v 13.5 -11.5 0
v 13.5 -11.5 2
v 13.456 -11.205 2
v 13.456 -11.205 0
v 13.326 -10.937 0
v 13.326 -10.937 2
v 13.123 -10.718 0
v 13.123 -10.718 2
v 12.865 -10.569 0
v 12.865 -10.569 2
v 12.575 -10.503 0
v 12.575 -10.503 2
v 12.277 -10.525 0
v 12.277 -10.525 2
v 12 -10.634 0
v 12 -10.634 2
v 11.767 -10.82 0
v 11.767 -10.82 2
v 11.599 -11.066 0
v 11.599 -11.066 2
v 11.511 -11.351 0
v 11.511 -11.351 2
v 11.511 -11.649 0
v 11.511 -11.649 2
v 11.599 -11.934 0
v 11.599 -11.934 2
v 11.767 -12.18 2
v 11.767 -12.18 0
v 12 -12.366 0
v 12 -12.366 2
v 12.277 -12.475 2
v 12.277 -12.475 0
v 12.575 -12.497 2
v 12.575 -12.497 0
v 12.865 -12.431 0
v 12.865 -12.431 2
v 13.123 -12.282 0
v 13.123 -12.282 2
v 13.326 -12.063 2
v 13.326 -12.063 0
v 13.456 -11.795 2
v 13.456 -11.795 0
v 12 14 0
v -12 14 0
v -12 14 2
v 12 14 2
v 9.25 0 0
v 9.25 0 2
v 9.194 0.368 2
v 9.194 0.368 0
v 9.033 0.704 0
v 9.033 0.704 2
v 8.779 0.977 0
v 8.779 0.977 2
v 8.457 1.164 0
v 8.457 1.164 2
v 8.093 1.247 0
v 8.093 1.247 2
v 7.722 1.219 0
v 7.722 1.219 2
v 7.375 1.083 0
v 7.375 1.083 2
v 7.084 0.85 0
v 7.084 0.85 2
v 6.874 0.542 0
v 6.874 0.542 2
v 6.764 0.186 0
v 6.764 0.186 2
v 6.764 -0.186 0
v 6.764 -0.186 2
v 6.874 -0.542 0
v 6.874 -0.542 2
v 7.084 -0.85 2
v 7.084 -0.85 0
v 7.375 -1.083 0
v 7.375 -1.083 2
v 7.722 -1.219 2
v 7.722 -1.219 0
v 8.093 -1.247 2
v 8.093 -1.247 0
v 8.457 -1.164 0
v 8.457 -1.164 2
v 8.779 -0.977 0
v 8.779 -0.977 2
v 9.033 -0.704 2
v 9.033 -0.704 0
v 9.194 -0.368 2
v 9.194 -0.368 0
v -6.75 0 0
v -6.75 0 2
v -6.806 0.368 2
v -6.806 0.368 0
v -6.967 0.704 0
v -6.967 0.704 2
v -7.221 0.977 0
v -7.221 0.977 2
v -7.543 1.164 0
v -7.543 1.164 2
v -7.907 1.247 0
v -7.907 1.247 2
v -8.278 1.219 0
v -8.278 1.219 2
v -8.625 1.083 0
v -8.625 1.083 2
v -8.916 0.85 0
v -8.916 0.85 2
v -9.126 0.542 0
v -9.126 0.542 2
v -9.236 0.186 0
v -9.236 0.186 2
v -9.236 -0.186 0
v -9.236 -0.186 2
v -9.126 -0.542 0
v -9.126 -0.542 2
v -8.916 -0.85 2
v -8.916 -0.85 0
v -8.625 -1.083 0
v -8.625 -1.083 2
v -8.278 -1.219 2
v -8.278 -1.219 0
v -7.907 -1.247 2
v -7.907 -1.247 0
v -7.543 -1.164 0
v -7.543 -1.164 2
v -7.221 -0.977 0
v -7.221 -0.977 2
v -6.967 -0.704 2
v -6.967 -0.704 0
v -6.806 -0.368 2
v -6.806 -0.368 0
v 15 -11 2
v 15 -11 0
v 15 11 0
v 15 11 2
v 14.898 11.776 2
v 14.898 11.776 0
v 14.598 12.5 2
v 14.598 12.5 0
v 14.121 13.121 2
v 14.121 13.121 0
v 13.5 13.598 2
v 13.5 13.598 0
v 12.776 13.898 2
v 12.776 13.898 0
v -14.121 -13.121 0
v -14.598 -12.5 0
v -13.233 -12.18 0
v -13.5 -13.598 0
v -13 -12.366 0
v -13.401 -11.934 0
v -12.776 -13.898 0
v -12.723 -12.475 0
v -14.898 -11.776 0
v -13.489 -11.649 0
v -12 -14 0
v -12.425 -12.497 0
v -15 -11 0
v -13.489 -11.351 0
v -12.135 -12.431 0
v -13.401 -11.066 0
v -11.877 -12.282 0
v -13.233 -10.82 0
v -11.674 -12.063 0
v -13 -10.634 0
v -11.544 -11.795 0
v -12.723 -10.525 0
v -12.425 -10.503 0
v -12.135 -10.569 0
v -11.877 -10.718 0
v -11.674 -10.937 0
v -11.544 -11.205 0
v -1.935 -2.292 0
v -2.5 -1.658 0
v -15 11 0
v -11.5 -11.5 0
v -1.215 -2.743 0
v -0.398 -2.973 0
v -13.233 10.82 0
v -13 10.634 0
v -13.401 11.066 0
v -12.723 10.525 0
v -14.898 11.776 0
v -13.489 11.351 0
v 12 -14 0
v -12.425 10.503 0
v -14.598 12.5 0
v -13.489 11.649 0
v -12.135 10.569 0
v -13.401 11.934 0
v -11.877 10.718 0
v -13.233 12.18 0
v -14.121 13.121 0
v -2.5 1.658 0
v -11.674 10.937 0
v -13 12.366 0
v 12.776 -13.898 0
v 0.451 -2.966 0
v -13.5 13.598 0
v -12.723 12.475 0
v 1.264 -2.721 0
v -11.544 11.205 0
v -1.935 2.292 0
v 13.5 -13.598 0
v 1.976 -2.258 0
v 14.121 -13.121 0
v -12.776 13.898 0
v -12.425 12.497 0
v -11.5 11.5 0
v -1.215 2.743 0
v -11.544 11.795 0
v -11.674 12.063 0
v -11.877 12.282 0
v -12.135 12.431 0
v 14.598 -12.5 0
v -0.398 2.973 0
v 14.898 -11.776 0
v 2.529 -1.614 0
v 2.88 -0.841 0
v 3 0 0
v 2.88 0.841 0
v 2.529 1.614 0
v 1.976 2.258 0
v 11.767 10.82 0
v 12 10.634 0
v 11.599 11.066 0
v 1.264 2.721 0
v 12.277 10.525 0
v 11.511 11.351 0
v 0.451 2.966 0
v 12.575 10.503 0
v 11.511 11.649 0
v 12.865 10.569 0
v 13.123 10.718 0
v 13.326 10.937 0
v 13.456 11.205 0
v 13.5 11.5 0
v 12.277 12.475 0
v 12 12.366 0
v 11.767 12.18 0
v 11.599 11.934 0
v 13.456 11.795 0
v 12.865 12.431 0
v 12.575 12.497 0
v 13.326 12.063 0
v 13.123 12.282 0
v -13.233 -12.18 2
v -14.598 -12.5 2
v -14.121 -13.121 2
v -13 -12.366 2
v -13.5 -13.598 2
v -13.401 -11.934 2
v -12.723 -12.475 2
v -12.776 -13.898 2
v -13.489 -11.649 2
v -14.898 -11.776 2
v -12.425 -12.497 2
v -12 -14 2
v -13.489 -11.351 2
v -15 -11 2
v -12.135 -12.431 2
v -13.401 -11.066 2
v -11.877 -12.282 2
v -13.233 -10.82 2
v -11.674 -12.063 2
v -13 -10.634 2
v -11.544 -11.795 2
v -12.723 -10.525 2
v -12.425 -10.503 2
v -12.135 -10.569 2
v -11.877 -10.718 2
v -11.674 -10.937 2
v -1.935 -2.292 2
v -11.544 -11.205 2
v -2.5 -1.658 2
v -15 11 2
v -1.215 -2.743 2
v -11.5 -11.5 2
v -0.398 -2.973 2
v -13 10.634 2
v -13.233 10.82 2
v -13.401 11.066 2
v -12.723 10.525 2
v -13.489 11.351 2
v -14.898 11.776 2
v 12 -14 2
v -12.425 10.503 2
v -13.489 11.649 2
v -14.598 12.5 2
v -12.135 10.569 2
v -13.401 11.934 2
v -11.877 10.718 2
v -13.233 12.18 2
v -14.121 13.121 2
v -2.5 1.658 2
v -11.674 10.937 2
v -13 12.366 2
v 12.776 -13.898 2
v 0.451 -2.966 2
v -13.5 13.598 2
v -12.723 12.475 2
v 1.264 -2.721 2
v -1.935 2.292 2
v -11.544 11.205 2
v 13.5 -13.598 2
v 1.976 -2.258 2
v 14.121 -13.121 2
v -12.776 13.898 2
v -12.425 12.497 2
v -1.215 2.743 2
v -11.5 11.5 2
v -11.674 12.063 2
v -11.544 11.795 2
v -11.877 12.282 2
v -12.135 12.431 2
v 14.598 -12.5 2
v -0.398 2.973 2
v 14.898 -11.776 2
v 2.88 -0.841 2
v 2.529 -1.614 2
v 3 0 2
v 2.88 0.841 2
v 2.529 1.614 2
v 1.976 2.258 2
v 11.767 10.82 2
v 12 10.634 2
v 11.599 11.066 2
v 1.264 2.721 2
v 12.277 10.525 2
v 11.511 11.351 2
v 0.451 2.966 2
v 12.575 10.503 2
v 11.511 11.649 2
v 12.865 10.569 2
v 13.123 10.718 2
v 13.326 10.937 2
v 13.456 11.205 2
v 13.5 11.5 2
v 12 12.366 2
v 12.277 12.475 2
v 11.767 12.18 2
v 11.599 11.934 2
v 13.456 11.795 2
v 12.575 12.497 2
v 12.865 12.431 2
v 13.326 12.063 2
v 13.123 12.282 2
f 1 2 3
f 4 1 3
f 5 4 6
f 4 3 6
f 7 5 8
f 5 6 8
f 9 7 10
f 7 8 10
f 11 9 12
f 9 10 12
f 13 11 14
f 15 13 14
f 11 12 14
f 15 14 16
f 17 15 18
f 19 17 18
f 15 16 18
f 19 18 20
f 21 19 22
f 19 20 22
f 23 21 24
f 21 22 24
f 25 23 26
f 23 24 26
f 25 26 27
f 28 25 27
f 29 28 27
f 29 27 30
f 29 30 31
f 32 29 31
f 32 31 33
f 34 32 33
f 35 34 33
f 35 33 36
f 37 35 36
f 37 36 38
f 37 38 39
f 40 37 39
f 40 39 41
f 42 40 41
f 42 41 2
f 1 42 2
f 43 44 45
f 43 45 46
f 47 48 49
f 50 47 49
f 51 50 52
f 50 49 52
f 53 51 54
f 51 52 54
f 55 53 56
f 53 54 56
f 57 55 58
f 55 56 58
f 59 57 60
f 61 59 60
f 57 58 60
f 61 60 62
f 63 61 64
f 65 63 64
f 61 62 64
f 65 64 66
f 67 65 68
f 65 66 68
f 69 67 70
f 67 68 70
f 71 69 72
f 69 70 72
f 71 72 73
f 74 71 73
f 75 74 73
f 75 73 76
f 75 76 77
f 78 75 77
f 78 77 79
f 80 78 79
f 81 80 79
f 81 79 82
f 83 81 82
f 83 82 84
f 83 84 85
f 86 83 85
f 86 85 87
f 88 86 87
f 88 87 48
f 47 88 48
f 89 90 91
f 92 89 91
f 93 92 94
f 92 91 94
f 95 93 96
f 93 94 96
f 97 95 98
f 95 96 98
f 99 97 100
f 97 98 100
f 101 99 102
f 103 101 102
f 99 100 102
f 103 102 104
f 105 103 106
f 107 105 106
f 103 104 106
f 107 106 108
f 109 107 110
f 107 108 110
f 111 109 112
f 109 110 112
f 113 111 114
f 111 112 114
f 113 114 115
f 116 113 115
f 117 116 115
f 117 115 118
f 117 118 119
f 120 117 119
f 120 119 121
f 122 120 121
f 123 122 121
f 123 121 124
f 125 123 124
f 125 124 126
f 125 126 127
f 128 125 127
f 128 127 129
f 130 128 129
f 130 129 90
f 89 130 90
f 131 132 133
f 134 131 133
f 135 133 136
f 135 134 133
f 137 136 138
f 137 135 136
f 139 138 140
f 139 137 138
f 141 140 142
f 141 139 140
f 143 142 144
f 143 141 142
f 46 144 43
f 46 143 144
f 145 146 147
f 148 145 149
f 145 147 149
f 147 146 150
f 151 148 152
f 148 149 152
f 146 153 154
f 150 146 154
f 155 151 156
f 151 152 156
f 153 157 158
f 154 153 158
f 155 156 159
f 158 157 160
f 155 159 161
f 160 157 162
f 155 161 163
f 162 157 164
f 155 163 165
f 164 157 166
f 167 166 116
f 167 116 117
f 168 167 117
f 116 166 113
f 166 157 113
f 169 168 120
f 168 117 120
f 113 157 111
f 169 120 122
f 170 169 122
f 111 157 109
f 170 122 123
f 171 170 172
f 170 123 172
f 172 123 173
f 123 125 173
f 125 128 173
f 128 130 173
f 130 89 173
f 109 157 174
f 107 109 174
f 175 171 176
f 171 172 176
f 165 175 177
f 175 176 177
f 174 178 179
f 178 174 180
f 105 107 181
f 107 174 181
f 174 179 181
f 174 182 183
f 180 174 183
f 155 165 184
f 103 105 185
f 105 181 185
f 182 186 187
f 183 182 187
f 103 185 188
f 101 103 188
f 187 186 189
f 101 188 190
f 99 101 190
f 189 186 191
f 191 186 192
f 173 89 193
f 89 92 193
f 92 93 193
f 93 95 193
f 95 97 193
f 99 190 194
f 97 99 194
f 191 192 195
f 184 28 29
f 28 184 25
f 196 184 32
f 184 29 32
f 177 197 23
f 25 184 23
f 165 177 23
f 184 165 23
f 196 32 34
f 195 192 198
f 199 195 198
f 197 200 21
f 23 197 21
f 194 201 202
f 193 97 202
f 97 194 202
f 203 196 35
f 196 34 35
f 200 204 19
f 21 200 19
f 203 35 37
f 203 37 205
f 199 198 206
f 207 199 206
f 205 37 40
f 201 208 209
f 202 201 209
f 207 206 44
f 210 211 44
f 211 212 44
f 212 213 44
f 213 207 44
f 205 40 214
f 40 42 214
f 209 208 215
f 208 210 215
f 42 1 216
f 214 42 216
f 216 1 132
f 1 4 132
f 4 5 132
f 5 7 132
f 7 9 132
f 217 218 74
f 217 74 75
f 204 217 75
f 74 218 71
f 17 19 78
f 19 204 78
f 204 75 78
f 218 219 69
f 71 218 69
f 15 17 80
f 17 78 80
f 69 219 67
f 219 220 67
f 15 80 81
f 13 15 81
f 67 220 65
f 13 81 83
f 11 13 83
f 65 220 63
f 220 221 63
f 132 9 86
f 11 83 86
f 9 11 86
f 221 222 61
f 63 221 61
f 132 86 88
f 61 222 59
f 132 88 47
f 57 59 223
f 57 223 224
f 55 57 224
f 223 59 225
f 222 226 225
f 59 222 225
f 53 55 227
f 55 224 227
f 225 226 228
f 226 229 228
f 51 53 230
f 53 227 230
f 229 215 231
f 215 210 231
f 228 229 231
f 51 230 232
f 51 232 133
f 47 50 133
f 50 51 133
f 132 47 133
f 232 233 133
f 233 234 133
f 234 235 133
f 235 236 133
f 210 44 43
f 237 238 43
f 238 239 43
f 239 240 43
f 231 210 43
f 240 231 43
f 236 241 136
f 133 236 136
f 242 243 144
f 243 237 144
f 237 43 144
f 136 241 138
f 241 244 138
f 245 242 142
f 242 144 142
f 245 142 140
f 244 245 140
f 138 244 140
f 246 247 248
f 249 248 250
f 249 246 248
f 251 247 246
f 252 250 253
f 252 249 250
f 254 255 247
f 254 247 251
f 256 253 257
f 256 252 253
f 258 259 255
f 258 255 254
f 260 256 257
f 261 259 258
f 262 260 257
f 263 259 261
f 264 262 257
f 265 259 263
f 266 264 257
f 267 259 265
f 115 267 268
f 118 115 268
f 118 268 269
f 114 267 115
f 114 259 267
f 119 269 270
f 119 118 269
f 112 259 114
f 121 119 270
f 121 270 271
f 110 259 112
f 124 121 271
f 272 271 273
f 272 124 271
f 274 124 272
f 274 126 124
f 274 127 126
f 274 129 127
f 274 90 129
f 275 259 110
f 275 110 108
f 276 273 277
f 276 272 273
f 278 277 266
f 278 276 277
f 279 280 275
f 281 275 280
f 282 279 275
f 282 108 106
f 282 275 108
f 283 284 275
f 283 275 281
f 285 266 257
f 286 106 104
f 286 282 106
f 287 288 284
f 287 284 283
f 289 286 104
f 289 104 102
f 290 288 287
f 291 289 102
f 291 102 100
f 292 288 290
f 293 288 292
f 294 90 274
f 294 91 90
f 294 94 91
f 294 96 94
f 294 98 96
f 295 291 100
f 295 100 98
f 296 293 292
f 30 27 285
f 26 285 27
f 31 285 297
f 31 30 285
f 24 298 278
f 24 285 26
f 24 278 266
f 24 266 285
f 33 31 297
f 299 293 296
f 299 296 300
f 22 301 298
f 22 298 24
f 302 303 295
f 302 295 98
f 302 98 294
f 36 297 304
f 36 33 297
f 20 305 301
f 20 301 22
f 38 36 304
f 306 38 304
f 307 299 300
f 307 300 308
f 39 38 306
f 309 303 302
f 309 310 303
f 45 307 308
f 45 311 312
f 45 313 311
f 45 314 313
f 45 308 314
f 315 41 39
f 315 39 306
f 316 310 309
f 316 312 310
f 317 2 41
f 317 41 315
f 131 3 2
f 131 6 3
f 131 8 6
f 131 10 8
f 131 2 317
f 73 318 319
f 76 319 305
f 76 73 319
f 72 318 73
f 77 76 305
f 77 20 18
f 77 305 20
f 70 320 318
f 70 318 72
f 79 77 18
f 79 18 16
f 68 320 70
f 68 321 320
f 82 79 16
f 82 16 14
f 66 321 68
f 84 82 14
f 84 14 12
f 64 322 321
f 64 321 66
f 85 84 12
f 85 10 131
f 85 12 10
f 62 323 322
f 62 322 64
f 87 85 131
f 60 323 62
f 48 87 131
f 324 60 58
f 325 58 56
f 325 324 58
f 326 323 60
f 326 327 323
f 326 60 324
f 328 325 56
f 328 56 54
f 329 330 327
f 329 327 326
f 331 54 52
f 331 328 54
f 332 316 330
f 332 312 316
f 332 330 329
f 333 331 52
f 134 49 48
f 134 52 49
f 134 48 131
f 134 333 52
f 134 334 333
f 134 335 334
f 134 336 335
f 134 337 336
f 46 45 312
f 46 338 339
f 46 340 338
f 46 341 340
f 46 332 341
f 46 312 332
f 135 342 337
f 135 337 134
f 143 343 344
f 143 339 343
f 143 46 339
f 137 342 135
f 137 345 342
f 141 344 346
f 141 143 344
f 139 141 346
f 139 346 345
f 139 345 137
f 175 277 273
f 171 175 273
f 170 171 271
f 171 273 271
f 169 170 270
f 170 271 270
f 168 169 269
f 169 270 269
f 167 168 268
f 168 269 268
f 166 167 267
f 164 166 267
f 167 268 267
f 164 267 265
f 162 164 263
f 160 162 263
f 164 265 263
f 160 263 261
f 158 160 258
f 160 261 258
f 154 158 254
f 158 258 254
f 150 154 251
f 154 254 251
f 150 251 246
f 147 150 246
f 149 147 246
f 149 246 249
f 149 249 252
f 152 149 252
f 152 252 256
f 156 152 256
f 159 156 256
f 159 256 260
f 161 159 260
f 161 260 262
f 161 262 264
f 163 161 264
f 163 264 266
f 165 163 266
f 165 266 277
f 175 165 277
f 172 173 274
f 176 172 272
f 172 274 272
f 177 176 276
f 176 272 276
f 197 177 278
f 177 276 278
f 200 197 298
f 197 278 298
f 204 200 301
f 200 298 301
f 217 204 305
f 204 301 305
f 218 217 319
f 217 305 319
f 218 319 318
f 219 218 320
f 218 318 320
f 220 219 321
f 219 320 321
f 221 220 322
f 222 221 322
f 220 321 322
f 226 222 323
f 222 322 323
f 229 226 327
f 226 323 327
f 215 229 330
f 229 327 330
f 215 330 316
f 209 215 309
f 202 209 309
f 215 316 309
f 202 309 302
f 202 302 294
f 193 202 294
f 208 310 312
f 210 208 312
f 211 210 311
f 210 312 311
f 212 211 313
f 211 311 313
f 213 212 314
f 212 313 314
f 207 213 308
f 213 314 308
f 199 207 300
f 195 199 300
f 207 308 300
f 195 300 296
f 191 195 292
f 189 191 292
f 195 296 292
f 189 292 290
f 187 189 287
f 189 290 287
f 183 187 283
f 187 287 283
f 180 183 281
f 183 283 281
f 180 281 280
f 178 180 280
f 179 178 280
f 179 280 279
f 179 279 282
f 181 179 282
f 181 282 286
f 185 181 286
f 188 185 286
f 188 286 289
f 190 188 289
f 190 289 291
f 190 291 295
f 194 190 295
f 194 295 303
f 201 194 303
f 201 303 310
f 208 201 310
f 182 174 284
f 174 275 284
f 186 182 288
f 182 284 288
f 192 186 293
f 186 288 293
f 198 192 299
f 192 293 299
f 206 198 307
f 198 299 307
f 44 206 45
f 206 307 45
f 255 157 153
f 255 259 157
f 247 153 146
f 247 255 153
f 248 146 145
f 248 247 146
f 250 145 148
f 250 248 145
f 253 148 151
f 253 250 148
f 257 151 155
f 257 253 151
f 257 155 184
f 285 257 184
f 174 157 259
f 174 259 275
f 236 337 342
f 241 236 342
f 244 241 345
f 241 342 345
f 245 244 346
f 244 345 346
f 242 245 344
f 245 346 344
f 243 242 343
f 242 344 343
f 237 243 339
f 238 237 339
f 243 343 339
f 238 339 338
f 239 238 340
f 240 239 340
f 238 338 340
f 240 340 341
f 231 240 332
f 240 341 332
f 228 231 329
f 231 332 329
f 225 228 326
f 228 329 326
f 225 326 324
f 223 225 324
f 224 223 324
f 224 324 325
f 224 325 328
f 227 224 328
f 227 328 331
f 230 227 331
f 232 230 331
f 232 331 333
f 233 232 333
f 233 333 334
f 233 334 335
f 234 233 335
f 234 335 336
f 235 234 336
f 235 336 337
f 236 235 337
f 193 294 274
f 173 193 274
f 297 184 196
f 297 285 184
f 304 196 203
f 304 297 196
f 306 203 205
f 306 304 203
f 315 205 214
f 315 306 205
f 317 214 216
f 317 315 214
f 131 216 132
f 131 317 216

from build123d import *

# Parameters (mm, degrees)
SKETCH_1_W          = 30
SKETCH_1_H          = 28
EXTRUDE_1_DEPTH     = 2
FILLET_1_R          = 3
SKETCH_2_R          = 1
SKETCH_2_R_2        = 1.25
CUT_EXTRUDE_1_DEPTH = 10
SKETCH_3_R          = 3
CUT_EXTRUDE_2_DEPTH = 10
EXTRUDE_2_DEPTH     = 2


with BuildPart() as part:
    # 草图1 → 凸台-拉伸1 (new body)
    with BuildSketch(Plane.XY):
        Rectangle(SKETCH_1_W, SKETCH_1_H)
    extrude(amount=EXTRUDE_1_DEPTH)

    # 圆角1
    fillet_1_edges = [part.edges().sort_by_distance(p)[0] for p in [
        (-15, -14, 1),
        (-15, 14, 1),
        (15, 14, 1),
        (15, -14, 1),
    ]]
    fillet(fillet_1_edges, radius=FILLET_1_R)

    # 草图2 → 切除-拉伸1 (cut)
    with BuildSketch(Plane.XY.offset(2)):
        with Locations((-12.5, 11.5)):
            Circle(SKETCH_2_R)
        with Locations((12.5, 11.5)):
            Circle(SKETCH_2_R)
        with Locations((-12.5, -11.5)):
            Circle(SKETCH_2_R)
        with Locations((12.5, -11.5)):
            Circle(SKETCH_2_R)
        with Locations((8, 0)):
            Circle(SKETCH_2_R_2)
        with Locations((-8, 0)):
            Circle(SKETCH_2_R_2)
    extrude(amount=-CUT_EXTRUDE_1_DEPTH, mode=Mode.SUBTRACT)

    # 草图3 → 切除-拉伸2 (cut)
    with BuildSketch(Plane.XY.offset(2)):
        Circle(SKETCH_3_R)
    extrude(amount=-CUT_EXTRUDE_2_DEPTH, mode=Mode.SUBTRACT)

    # 草图4 → 凸台-拉伸2 (add)
    with BuildSketch(Plane.XY.offset(2)):
        with BuildLine():
            Line((-2.5, 1.658312395), (-2.5, -1.658312395))
            ThreePointArc((-2.5, -1.658312395), (-3, 0), (-2.5, 1.658312395))
        make_face()
    extrude(amount=-EXTRUDE_2_DEPTH)


solid = part.part
